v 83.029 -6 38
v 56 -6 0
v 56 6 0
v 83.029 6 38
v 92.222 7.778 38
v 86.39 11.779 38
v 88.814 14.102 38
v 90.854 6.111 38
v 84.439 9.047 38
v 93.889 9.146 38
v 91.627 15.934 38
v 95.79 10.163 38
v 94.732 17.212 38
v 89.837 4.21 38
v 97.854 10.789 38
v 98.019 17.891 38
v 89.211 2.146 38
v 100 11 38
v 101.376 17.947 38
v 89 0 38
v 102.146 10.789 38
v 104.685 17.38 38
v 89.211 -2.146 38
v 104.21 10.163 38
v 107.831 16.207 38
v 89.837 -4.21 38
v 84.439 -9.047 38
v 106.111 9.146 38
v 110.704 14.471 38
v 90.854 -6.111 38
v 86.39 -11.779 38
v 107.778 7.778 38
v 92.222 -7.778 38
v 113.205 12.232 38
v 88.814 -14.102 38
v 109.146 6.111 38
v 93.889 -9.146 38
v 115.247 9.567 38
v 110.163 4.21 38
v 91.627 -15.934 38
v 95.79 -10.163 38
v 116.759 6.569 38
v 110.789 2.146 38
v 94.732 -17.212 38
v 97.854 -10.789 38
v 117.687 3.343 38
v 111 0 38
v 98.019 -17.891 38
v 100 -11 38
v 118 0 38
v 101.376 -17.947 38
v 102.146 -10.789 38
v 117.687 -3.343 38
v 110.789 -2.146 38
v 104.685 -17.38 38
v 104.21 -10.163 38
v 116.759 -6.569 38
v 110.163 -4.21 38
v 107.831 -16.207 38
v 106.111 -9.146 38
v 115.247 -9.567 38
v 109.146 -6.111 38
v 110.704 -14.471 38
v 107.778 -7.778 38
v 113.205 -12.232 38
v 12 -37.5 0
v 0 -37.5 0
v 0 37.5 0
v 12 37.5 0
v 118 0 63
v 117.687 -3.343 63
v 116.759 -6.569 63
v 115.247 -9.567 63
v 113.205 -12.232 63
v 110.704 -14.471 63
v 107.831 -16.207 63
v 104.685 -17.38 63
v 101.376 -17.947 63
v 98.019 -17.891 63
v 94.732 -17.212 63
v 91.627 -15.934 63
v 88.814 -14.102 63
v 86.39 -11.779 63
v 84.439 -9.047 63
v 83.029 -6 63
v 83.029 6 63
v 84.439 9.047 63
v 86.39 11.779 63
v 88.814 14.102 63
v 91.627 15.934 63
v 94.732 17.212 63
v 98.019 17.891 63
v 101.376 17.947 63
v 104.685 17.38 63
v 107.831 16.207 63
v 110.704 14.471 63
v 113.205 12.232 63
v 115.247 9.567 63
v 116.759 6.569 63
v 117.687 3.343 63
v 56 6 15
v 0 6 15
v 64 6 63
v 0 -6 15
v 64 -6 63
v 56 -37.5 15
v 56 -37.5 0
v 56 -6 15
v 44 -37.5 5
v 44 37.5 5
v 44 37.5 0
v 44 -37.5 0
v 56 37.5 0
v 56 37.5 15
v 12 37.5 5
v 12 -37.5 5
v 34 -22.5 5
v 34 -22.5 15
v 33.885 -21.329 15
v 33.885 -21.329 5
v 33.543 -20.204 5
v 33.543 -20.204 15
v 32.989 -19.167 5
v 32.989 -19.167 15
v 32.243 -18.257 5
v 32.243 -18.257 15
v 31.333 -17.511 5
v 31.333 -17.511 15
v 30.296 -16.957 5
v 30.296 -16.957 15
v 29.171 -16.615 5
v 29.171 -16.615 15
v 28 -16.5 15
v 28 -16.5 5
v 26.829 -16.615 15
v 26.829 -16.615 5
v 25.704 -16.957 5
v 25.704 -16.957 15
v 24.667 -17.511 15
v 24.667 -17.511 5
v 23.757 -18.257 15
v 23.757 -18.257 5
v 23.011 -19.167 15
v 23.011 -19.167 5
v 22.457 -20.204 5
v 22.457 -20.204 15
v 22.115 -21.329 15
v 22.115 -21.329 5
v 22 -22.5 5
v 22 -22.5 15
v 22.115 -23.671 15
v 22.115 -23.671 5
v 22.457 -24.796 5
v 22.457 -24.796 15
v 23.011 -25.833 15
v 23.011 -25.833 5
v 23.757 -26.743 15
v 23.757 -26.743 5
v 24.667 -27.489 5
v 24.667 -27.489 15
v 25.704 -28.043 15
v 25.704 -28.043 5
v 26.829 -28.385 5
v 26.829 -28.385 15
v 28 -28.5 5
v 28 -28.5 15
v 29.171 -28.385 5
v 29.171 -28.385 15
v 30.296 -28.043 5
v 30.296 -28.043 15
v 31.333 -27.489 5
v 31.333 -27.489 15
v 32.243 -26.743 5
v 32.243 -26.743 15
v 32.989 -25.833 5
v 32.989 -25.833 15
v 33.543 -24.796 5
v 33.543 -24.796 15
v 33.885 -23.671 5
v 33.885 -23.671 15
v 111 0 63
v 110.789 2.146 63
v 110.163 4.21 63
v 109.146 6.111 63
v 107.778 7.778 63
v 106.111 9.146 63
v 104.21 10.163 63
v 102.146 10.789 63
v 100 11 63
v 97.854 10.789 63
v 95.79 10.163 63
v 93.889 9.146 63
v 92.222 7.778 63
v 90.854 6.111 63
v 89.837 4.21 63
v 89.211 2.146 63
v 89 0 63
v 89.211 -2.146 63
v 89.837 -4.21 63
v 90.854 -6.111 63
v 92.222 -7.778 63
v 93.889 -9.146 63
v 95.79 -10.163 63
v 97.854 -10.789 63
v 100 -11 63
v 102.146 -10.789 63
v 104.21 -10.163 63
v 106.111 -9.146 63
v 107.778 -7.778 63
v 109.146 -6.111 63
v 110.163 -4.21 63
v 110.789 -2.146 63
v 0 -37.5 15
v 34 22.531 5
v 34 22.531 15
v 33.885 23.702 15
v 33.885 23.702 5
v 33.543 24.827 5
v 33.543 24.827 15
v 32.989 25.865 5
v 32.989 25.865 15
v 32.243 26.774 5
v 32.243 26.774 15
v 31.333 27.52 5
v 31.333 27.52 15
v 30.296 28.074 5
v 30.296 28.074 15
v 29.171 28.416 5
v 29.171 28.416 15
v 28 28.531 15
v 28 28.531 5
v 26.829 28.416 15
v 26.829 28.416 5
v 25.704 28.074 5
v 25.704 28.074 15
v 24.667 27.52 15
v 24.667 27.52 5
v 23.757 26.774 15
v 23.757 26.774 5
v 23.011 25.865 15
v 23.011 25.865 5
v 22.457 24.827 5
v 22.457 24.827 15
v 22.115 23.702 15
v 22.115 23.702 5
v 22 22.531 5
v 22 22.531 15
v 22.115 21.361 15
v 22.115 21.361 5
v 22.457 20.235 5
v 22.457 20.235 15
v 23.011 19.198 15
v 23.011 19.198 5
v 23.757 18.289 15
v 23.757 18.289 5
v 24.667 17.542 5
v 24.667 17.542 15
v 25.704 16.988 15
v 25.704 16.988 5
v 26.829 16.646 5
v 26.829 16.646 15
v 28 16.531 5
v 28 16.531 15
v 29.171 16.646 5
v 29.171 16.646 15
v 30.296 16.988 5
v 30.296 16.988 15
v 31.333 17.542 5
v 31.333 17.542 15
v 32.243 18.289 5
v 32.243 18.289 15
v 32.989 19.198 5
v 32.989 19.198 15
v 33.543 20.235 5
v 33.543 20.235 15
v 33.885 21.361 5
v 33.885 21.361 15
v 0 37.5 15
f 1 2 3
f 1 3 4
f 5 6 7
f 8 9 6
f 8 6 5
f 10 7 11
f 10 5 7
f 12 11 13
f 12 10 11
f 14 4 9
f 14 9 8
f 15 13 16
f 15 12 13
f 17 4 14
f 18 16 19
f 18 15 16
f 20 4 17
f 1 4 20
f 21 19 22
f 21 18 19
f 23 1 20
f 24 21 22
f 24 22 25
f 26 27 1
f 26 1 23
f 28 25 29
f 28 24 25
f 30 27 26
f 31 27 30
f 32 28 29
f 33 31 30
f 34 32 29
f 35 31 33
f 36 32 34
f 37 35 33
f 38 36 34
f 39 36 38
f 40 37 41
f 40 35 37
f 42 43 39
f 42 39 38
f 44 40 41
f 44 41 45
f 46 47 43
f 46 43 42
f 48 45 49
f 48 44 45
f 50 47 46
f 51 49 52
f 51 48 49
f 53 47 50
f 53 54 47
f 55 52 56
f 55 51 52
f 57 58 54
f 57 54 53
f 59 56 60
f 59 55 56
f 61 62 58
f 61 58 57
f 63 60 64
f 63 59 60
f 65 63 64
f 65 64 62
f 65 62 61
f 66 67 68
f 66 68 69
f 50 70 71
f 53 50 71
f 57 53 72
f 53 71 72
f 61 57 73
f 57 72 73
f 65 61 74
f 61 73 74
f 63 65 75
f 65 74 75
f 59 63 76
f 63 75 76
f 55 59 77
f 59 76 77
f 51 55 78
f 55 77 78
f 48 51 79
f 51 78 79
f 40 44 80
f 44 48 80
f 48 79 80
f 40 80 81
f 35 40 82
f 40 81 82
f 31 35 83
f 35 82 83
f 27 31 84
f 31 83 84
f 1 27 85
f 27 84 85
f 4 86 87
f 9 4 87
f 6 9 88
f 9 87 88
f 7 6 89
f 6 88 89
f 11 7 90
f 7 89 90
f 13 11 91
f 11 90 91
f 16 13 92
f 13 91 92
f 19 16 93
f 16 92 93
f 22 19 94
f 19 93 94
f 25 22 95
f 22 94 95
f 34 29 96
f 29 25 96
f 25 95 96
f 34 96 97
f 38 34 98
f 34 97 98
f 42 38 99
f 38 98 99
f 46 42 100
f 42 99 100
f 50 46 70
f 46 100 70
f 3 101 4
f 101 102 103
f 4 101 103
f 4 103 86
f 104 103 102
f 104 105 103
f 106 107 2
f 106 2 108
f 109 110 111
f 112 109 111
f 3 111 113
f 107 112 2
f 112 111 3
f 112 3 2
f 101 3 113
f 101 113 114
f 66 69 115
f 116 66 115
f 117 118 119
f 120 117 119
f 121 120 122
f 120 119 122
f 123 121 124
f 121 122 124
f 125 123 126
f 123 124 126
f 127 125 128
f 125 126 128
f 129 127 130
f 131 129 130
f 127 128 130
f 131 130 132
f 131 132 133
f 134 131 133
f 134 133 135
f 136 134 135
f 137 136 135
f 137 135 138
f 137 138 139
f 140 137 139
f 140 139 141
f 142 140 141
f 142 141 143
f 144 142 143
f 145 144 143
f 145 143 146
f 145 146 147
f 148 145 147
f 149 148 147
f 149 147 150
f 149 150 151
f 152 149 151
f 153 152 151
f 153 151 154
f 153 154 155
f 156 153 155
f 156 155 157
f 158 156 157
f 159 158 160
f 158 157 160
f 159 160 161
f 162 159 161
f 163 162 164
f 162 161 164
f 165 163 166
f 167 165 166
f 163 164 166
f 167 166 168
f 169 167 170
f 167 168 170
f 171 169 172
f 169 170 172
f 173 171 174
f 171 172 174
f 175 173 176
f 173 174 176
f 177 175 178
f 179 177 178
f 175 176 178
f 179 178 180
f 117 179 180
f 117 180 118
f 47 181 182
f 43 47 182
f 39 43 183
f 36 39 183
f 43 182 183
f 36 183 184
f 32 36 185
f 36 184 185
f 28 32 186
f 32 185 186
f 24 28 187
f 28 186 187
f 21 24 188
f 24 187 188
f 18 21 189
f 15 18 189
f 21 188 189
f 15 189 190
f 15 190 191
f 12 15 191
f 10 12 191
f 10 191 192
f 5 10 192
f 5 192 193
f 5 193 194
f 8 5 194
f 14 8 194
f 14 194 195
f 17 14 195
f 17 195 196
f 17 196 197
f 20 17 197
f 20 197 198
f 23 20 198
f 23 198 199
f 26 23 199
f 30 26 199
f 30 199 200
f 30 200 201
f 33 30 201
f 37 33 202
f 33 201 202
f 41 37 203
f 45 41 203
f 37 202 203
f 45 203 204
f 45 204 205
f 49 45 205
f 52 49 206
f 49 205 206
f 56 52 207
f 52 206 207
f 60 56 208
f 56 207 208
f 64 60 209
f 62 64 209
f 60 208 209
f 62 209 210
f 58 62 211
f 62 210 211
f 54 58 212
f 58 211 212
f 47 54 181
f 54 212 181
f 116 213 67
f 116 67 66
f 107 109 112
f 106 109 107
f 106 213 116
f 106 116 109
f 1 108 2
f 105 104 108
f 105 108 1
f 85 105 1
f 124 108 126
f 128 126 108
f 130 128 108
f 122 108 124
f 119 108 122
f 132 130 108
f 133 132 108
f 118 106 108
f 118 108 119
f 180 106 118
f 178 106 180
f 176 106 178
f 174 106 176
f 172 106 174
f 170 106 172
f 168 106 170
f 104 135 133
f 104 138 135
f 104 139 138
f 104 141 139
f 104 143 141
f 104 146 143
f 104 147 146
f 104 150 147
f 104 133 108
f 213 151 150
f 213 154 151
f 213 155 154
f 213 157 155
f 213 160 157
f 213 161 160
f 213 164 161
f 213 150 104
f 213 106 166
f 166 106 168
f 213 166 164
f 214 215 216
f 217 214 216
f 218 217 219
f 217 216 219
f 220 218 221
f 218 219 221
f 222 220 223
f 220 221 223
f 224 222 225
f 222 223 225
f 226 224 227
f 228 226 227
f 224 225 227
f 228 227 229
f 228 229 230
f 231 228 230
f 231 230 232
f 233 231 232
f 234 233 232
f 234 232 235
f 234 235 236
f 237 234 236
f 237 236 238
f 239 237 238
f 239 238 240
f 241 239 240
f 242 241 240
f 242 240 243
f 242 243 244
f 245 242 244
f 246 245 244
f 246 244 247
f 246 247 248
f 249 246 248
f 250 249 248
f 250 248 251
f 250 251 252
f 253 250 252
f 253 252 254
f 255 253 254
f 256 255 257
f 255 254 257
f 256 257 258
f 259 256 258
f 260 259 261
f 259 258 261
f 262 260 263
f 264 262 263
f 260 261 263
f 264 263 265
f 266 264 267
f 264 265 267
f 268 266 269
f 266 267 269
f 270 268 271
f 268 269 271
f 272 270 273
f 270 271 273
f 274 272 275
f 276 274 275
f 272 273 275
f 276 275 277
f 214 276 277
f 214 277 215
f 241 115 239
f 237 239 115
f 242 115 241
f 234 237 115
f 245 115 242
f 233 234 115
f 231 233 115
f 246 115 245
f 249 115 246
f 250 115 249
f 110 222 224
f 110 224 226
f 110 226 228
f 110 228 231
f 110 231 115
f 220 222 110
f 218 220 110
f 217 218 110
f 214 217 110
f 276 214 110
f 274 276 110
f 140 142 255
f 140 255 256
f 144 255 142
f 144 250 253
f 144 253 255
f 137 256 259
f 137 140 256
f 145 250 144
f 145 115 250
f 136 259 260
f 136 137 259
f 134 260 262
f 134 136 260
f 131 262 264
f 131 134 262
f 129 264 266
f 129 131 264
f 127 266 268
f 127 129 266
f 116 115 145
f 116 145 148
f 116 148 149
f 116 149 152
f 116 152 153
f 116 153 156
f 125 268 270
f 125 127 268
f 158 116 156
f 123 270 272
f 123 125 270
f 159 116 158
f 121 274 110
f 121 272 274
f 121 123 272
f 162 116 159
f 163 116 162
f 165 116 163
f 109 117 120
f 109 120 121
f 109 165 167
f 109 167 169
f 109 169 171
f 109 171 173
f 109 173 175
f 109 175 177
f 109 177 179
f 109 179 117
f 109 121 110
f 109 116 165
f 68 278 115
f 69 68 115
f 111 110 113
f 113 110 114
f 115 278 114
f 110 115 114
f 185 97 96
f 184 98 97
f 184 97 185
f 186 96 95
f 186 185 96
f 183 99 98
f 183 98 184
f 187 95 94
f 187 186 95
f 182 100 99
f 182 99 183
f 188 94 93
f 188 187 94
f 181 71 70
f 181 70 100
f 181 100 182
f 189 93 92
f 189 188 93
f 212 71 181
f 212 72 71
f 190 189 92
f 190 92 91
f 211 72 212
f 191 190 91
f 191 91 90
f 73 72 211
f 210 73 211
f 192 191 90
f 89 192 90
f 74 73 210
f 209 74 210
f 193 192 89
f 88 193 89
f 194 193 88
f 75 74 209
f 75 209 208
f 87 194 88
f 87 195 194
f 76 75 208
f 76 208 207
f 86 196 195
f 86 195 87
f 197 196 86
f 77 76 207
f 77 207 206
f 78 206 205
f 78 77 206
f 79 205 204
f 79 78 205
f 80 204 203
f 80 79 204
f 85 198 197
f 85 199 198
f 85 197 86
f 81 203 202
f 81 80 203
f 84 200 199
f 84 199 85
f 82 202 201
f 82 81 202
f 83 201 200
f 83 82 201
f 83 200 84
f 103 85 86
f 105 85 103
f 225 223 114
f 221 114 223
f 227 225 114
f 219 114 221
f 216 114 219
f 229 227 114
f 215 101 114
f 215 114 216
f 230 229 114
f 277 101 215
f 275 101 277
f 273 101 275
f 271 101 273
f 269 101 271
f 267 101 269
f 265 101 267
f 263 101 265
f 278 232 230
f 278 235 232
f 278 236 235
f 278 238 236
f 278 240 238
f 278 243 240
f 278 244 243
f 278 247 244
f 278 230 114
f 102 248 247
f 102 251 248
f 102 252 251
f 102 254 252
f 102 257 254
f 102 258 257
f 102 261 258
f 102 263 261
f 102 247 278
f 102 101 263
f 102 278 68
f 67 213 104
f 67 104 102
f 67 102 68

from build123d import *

# Parameters (mm, degrees)
F1_DEPTH = 37.5
F0_W     = 34.9705627485
F0_H     = 25
F2_R     = 6
F2_R_2   = 11
F3_DEPTH = 63.001
F4_DEPTH = 6


with BuildPart() as f1:
    # F0 (on Front) → F1 (new body, symmetric)
    with BuildSketch(Plane.XZ):
        Polygon((0, 15), (0, 0), (12, 0), (12, 5), (44, 5), (44, 0), (56, 0), (56, 15), align=None)
    extrude(amount=F1_DEPTH, both=True)


with BuildPart() as f1b:
    # F0 (on Front) → F1, piece 2 (new body, symmetric)
    with BuildSketch(Plane.XZ):
        with Locations((100.5147186258, 50.5)):
            Rectangle(F0_W, F0_H)
    extrude(amount=F1_DEPTH, both=True)


with BuildPart() as f3_tool:
    # F2 (on face) → F3 (new body, through all)
    with BuildSketch(Plane.XY.offset(63)):
        with Locations((28, -22.5)):
            Circle(F2_R)
        with Locations((100, 0)):
            Circle(F2_R_2)
        with Locations((28, 22.5312)):
            Circle(F2_R)
        with BuildLine():
            ThreePointArc((83.0294372515, 6), (103.0438356171, 17.7407740738), (118, 0))
            Line((118, 0), (118, 37.5))
            Line((118, 37.5), (83.0294372515, 37.5))
            Line((83.0294372515, 37.5), (83.0294372515, 6))
        make_face()
        with BuildLine():
            Line((118, -37.5), (118, 0))
            ThreePointArc((118, 0), (103.0438356171, -17.7407740738), (83.0294372515, -6))
            Line((83.0294372515, -6), (83.0294372515, -37.5))
            Line((83.0294372515, -37.5), (118, -37.5))
        make_face()
    extrude(amount=-F3_DEPTH)


with BuildPart() as f1_1:
    add(f1.part)

    # F3: cut by f3_tool
    add(f3_tool.part, mode=Mode.SUBTRACT)



with BuildPart() as f1b_1:
    add(f1b.part)

    # F3: cut by f3_tool
    add(f3_tool.part, mode=Mode.SUBTRACT)


with BuildPart() as f1_2:
    add(f1_1.part)

    add(f1b_1.part)  # F4 merges F1b
    # F0 (on Front) → F4 (join, symmetric)
    with BuildSketch(Plane.XZ):
        Polygon((64, 63), (0, 15), (56, 15), (56, 0), (83.0294372515, 38), (83.0294372515, 63), (82, 63), align=None)
    extrude(amount=F4_DEPTH, both=True)


solid = f1_2.part
